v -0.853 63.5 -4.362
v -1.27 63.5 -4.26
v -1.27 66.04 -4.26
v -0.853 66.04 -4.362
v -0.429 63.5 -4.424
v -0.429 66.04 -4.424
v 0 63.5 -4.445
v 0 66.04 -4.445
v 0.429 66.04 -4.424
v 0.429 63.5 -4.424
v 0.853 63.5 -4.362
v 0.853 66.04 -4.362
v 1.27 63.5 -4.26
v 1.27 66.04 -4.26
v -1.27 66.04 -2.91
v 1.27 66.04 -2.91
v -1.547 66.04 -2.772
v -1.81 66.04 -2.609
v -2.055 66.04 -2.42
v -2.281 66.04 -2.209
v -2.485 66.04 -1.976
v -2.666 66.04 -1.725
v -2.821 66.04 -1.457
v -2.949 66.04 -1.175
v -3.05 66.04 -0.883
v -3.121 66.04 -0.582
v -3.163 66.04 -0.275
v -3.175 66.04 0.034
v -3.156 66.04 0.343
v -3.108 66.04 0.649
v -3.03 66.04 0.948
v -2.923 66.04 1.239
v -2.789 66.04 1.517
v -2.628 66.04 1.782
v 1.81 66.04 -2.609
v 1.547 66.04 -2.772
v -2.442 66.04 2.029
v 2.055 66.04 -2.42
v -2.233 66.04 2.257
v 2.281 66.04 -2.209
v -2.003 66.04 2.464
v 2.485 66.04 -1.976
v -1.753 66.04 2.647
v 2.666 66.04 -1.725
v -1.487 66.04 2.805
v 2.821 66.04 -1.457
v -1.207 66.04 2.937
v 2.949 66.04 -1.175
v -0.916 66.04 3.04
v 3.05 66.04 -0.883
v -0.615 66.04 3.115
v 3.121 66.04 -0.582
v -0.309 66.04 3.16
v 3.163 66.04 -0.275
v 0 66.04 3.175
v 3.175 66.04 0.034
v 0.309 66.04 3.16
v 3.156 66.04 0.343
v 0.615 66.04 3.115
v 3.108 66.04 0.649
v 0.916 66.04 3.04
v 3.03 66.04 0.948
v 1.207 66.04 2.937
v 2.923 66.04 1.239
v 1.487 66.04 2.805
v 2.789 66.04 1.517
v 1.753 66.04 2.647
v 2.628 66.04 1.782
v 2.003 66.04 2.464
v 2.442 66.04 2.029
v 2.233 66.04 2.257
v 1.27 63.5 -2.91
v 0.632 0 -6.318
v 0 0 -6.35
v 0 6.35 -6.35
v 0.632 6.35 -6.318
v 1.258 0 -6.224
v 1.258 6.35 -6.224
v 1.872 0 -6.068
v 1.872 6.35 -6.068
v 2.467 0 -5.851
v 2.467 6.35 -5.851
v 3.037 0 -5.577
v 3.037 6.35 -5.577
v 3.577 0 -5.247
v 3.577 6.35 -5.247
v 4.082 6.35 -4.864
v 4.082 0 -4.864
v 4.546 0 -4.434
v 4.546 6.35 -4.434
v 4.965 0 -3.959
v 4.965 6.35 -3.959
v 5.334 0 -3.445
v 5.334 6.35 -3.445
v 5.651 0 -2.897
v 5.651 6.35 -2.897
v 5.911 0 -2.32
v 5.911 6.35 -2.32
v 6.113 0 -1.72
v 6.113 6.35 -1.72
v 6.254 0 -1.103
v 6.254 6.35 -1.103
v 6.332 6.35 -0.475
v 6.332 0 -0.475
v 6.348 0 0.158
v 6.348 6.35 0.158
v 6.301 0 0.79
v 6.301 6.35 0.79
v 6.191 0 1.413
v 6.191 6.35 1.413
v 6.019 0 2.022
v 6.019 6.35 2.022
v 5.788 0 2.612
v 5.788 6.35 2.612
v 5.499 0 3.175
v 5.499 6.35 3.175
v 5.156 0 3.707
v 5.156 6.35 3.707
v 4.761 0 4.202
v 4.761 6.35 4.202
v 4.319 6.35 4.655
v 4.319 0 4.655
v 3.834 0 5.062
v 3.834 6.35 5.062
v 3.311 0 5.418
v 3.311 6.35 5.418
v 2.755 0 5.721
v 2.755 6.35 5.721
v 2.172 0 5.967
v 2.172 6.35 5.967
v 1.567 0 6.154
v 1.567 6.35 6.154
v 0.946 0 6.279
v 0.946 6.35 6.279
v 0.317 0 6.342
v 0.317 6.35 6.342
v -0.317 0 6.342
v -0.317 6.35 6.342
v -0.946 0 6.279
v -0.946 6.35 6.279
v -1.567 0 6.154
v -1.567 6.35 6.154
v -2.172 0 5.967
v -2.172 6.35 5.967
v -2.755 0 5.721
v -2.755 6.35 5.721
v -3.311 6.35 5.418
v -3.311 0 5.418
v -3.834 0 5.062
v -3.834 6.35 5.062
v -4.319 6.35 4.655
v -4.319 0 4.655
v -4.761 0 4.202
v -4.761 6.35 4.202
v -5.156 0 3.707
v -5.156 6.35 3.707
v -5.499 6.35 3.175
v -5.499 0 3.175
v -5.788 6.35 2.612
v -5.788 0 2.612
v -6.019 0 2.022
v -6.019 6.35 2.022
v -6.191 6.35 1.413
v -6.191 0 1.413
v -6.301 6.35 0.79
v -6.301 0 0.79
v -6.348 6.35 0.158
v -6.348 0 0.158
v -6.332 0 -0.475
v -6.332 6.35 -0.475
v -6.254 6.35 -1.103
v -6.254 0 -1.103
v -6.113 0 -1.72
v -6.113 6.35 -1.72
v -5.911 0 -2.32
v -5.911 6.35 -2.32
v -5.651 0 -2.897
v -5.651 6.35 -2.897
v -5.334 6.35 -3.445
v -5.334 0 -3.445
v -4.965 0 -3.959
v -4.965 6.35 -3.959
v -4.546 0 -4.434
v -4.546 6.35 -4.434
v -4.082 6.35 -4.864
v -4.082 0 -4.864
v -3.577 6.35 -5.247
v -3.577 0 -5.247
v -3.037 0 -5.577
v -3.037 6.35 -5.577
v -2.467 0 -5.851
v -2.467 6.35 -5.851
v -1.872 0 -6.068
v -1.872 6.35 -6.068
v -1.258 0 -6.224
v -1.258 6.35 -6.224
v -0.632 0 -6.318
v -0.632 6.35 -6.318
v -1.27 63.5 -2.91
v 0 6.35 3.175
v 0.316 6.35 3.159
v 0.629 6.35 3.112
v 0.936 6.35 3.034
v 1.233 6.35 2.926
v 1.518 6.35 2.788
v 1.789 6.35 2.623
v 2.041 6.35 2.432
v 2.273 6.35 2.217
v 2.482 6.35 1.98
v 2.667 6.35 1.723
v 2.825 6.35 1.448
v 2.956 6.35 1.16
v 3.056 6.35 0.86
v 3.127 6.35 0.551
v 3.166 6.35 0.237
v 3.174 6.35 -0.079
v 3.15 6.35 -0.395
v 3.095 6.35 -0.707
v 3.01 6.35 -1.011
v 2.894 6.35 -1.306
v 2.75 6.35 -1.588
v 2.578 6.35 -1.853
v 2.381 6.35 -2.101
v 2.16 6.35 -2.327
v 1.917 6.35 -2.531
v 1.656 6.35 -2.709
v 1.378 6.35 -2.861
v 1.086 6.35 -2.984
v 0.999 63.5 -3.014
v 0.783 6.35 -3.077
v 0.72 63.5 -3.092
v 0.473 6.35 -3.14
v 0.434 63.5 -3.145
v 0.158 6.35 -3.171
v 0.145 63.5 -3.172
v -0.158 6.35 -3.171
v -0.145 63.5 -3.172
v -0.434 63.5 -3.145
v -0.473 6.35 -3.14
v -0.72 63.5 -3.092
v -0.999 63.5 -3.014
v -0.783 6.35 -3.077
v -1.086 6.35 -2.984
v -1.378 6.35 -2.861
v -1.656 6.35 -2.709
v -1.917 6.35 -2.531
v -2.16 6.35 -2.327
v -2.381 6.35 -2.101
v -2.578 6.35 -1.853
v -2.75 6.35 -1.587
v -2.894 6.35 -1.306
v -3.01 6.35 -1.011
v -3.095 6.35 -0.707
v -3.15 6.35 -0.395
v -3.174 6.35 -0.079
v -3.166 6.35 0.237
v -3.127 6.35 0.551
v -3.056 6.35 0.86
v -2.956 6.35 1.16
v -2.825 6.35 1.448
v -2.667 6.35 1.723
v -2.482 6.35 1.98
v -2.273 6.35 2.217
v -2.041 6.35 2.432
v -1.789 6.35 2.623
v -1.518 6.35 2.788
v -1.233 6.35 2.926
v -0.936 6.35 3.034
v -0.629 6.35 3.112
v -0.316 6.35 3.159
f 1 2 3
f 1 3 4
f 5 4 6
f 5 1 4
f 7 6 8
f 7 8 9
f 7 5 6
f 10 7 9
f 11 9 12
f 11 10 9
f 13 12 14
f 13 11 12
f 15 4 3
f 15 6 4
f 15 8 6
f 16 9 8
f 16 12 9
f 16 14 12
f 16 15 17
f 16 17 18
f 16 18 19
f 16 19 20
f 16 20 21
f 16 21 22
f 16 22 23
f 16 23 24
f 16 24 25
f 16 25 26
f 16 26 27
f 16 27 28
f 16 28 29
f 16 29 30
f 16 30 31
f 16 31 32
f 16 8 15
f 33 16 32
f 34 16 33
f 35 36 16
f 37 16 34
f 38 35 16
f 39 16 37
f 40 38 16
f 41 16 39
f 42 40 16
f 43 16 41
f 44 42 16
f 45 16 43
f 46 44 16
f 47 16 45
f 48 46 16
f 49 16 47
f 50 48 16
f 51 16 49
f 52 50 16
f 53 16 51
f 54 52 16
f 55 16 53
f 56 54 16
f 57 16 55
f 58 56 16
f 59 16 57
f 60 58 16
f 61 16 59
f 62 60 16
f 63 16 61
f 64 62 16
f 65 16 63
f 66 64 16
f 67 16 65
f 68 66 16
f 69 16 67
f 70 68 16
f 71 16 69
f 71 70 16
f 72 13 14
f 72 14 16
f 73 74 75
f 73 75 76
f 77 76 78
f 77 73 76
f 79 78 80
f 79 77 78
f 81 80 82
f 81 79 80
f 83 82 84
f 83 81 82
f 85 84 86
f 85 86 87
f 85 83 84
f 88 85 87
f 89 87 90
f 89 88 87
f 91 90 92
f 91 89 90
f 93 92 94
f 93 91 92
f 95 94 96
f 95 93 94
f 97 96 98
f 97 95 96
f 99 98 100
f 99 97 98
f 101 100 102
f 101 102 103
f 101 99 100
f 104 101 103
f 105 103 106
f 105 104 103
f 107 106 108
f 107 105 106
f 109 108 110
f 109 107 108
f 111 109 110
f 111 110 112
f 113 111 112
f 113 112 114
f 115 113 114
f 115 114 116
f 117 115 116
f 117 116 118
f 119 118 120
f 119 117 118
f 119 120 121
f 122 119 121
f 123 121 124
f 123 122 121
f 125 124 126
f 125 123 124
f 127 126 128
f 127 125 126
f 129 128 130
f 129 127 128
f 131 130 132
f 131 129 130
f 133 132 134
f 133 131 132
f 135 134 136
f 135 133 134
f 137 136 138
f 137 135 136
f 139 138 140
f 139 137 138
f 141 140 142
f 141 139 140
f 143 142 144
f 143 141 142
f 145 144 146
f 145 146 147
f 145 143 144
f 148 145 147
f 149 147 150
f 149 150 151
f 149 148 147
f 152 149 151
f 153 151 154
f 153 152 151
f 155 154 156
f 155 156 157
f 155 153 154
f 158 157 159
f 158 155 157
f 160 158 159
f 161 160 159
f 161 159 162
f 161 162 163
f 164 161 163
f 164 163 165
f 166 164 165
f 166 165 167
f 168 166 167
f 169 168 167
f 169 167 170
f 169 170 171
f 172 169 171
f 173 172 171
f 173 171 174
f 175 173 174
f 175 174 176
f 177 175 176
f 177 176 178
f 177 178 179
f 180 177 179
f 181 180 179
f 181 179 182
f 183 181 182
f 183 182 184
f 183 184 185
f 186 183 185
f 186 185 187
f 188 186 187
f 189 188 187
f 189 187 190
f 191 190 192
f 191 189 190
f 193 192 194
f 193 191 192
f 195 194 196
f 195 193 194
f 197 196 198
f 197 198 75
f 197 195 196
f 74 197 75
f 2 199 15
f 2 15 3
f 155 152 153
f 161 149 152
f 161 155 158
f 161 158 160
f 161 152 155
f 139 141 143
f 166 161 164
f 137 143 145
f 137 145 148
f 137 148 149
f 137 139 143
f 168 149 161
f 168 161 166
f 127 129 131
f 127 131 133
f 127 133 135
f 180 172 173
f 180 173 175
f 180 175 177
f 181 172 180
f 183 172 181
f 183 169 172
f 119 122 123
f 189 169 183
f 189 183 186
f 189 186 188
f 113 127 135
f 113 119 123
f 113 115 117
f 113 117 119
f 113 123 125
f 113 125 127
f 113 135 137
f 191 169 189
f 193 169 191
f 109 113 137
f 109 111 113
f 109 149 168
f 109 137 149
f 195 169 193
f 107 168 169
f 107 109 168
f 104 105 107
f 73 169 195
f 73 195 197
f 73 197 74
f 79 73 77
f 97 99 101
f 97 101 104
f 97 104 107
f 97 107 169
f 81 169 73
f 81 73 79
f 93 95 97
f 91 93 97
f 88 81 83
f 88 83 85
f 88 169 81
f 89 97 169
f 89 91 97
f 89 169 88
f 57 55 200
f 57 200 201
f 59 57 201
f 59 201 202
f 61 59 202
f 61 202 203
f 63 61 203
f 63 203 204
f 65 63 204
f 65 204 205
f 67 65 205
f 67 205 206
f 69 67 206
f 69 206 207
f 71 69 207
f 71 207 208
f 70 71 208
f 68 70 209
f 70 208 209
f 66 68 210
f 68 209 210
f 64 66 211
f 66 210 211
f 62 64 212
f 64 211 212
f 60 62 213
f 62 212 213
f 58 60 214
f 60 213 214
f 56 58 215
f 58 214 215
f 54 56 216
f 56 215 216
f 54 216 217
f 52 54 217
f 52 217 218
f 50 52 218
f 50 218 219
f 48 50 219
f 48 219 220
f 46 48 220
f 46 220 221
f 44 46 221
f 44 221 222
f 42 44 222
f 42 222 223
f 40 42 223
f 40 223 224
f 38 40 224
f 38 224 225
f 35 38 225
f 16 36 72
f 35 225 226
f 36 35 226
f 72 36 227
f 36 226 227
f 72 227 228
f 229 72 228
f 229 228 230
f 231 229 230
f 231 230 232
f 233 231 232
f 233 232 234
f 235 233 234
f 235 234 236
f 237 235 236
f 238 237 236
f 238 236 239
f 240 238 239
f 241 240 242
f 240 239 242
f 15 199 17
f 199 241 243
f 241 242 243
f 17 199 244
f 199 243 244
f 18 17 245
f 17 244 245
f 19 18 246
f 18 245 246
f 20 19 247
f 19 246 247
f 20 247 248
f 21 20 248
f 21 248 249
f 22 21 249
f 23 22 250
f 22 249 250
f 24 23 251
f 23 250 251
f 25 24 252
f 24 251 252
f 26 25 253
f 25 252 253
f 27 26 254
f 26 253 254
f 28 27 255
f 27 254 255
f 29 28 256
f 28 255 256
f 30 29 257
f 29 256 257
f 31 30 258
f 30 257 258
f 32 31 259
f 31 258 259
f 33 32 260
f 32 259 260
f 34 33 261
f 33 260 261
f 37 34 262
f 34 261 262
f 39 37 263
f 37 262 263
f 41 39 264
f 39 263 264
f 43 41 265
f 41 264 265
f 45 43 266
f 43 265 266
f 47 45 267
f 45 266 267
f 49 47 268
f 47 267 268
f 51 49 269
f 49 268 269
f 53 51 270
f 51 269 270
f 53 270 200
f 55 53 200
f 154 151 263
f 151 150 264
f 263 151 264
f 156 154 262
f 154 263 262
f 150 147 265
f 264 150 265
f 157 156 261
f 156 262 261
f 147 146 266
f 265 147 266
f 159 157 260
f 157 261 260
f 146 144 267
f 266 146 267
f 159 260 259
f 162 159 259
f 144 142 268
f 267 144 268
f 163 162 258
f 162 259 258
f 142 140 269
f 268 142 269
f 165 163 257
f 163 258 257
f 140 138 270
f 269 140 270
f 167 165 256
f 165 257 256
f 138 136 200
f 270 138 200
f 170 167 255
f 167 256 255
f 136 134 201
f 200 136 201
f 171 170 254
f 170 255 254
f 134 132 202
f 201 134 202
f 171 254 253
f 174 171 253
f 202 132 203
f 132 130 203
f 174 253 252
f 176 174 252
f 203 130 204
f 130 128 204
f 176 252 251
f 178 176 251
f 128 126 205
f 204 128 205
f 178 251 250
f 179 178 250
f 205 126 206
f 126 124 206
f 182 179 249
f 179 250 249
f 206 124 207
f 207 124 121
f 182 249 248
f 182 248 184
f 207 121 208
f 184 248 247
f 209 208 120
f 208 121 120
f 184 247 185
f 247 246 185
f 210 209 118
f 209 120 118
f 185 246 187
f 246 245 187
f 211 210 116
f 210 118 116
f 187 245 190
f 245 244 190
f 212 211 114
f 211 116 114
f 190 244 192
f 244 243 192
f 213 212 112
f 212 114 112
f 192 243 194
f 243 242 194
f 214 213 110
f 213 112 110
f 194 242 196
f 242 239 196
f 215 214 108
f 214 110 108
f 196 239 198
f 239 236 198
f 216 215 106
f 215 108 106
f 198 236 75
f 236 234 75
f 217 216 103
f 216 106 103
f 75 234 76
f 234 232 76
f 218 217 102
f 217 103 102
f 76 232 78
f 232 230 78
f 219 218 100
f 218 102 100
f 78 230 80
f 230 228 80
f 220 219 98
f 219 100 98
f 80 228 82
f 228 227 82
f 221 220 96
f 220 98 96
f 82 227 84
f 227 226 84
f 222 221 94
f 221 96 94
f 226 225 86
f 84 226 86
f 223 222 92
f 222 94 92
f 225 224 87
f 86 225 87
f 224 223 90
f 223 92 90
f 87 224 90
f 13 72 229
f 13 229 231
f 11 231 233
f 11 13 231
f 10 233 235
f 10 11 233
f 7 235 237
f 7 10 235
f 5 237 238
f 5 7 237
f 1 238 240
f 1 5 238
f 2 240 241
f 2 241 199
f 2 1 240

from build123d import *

# Parameters (mm, degrees)
SKETCH1_R           = 3.175
BOSS_EXTRUDE1_DEPTH = 66.04
BOSS_EXTRUDE2_START = -2.54
BOSS_EXTRUDE2_DEPTH = 2.54
SKETCH3_R           = 6.35
SKETCH3_R_2         = 3.175
BOSS_EXTRUDE3_DEPTH = 6.35


with BuildPart() as part:
    # Sketch1 → Boss-Extrude1 (new body)
    with BuildSketch(Plane(origin=(0, 0, 0), x_dir=(1, 0, 0), z_dir=(0, 1, 0))):
        with Locations(Location((0, 0, 0), (0, 0, 270))):
            Circle(SKETCH1_R)
    extrude(amount=BOSS_EXTRUDE1_DEPTH)

    # Sketch2 → Boss-Extrude2 (add)
    with BuildSketch(Plane(origin=(0, 66.04, 0), x_dir=(1, 0, 0), z_dir=(0, 1, 0)).offset(BOSS_EXTRUDE2_START)):
        with BuildLine():
            Line((1.27, 4.259709497), (1.27, 2.909935566))
            ThreePointArc((1.27, 2.909935566), (0, 3.175), (-1.27, 2.909935566))
            Line((-1.27, 2.909935566), (-1.27, 4.259709497))
            ThreePointArc((-1.27, 4.259709497), (0, 4.445), (1.27, 4.259709497))
        make_face()
    extrude(amount=BOSS_EXTRUDE2_DEPTH)

    # Sketch3 → Boss-Extrude3 (add)
    with BuildSketch(Plane.XZ):
        with Locations(Location((0, 0, 0), (0, 0, 270))):
            Circle(SKETCH3_R)
        with Locations(Location((0, 0, 0), (0, 0, 270))):
            Circle(SKETCH3_R_2, mode=Mode.SUBTRACT)
    extrude(amount=-BOSS_EXTRUDE3_DEPTH)


solid = part.part
